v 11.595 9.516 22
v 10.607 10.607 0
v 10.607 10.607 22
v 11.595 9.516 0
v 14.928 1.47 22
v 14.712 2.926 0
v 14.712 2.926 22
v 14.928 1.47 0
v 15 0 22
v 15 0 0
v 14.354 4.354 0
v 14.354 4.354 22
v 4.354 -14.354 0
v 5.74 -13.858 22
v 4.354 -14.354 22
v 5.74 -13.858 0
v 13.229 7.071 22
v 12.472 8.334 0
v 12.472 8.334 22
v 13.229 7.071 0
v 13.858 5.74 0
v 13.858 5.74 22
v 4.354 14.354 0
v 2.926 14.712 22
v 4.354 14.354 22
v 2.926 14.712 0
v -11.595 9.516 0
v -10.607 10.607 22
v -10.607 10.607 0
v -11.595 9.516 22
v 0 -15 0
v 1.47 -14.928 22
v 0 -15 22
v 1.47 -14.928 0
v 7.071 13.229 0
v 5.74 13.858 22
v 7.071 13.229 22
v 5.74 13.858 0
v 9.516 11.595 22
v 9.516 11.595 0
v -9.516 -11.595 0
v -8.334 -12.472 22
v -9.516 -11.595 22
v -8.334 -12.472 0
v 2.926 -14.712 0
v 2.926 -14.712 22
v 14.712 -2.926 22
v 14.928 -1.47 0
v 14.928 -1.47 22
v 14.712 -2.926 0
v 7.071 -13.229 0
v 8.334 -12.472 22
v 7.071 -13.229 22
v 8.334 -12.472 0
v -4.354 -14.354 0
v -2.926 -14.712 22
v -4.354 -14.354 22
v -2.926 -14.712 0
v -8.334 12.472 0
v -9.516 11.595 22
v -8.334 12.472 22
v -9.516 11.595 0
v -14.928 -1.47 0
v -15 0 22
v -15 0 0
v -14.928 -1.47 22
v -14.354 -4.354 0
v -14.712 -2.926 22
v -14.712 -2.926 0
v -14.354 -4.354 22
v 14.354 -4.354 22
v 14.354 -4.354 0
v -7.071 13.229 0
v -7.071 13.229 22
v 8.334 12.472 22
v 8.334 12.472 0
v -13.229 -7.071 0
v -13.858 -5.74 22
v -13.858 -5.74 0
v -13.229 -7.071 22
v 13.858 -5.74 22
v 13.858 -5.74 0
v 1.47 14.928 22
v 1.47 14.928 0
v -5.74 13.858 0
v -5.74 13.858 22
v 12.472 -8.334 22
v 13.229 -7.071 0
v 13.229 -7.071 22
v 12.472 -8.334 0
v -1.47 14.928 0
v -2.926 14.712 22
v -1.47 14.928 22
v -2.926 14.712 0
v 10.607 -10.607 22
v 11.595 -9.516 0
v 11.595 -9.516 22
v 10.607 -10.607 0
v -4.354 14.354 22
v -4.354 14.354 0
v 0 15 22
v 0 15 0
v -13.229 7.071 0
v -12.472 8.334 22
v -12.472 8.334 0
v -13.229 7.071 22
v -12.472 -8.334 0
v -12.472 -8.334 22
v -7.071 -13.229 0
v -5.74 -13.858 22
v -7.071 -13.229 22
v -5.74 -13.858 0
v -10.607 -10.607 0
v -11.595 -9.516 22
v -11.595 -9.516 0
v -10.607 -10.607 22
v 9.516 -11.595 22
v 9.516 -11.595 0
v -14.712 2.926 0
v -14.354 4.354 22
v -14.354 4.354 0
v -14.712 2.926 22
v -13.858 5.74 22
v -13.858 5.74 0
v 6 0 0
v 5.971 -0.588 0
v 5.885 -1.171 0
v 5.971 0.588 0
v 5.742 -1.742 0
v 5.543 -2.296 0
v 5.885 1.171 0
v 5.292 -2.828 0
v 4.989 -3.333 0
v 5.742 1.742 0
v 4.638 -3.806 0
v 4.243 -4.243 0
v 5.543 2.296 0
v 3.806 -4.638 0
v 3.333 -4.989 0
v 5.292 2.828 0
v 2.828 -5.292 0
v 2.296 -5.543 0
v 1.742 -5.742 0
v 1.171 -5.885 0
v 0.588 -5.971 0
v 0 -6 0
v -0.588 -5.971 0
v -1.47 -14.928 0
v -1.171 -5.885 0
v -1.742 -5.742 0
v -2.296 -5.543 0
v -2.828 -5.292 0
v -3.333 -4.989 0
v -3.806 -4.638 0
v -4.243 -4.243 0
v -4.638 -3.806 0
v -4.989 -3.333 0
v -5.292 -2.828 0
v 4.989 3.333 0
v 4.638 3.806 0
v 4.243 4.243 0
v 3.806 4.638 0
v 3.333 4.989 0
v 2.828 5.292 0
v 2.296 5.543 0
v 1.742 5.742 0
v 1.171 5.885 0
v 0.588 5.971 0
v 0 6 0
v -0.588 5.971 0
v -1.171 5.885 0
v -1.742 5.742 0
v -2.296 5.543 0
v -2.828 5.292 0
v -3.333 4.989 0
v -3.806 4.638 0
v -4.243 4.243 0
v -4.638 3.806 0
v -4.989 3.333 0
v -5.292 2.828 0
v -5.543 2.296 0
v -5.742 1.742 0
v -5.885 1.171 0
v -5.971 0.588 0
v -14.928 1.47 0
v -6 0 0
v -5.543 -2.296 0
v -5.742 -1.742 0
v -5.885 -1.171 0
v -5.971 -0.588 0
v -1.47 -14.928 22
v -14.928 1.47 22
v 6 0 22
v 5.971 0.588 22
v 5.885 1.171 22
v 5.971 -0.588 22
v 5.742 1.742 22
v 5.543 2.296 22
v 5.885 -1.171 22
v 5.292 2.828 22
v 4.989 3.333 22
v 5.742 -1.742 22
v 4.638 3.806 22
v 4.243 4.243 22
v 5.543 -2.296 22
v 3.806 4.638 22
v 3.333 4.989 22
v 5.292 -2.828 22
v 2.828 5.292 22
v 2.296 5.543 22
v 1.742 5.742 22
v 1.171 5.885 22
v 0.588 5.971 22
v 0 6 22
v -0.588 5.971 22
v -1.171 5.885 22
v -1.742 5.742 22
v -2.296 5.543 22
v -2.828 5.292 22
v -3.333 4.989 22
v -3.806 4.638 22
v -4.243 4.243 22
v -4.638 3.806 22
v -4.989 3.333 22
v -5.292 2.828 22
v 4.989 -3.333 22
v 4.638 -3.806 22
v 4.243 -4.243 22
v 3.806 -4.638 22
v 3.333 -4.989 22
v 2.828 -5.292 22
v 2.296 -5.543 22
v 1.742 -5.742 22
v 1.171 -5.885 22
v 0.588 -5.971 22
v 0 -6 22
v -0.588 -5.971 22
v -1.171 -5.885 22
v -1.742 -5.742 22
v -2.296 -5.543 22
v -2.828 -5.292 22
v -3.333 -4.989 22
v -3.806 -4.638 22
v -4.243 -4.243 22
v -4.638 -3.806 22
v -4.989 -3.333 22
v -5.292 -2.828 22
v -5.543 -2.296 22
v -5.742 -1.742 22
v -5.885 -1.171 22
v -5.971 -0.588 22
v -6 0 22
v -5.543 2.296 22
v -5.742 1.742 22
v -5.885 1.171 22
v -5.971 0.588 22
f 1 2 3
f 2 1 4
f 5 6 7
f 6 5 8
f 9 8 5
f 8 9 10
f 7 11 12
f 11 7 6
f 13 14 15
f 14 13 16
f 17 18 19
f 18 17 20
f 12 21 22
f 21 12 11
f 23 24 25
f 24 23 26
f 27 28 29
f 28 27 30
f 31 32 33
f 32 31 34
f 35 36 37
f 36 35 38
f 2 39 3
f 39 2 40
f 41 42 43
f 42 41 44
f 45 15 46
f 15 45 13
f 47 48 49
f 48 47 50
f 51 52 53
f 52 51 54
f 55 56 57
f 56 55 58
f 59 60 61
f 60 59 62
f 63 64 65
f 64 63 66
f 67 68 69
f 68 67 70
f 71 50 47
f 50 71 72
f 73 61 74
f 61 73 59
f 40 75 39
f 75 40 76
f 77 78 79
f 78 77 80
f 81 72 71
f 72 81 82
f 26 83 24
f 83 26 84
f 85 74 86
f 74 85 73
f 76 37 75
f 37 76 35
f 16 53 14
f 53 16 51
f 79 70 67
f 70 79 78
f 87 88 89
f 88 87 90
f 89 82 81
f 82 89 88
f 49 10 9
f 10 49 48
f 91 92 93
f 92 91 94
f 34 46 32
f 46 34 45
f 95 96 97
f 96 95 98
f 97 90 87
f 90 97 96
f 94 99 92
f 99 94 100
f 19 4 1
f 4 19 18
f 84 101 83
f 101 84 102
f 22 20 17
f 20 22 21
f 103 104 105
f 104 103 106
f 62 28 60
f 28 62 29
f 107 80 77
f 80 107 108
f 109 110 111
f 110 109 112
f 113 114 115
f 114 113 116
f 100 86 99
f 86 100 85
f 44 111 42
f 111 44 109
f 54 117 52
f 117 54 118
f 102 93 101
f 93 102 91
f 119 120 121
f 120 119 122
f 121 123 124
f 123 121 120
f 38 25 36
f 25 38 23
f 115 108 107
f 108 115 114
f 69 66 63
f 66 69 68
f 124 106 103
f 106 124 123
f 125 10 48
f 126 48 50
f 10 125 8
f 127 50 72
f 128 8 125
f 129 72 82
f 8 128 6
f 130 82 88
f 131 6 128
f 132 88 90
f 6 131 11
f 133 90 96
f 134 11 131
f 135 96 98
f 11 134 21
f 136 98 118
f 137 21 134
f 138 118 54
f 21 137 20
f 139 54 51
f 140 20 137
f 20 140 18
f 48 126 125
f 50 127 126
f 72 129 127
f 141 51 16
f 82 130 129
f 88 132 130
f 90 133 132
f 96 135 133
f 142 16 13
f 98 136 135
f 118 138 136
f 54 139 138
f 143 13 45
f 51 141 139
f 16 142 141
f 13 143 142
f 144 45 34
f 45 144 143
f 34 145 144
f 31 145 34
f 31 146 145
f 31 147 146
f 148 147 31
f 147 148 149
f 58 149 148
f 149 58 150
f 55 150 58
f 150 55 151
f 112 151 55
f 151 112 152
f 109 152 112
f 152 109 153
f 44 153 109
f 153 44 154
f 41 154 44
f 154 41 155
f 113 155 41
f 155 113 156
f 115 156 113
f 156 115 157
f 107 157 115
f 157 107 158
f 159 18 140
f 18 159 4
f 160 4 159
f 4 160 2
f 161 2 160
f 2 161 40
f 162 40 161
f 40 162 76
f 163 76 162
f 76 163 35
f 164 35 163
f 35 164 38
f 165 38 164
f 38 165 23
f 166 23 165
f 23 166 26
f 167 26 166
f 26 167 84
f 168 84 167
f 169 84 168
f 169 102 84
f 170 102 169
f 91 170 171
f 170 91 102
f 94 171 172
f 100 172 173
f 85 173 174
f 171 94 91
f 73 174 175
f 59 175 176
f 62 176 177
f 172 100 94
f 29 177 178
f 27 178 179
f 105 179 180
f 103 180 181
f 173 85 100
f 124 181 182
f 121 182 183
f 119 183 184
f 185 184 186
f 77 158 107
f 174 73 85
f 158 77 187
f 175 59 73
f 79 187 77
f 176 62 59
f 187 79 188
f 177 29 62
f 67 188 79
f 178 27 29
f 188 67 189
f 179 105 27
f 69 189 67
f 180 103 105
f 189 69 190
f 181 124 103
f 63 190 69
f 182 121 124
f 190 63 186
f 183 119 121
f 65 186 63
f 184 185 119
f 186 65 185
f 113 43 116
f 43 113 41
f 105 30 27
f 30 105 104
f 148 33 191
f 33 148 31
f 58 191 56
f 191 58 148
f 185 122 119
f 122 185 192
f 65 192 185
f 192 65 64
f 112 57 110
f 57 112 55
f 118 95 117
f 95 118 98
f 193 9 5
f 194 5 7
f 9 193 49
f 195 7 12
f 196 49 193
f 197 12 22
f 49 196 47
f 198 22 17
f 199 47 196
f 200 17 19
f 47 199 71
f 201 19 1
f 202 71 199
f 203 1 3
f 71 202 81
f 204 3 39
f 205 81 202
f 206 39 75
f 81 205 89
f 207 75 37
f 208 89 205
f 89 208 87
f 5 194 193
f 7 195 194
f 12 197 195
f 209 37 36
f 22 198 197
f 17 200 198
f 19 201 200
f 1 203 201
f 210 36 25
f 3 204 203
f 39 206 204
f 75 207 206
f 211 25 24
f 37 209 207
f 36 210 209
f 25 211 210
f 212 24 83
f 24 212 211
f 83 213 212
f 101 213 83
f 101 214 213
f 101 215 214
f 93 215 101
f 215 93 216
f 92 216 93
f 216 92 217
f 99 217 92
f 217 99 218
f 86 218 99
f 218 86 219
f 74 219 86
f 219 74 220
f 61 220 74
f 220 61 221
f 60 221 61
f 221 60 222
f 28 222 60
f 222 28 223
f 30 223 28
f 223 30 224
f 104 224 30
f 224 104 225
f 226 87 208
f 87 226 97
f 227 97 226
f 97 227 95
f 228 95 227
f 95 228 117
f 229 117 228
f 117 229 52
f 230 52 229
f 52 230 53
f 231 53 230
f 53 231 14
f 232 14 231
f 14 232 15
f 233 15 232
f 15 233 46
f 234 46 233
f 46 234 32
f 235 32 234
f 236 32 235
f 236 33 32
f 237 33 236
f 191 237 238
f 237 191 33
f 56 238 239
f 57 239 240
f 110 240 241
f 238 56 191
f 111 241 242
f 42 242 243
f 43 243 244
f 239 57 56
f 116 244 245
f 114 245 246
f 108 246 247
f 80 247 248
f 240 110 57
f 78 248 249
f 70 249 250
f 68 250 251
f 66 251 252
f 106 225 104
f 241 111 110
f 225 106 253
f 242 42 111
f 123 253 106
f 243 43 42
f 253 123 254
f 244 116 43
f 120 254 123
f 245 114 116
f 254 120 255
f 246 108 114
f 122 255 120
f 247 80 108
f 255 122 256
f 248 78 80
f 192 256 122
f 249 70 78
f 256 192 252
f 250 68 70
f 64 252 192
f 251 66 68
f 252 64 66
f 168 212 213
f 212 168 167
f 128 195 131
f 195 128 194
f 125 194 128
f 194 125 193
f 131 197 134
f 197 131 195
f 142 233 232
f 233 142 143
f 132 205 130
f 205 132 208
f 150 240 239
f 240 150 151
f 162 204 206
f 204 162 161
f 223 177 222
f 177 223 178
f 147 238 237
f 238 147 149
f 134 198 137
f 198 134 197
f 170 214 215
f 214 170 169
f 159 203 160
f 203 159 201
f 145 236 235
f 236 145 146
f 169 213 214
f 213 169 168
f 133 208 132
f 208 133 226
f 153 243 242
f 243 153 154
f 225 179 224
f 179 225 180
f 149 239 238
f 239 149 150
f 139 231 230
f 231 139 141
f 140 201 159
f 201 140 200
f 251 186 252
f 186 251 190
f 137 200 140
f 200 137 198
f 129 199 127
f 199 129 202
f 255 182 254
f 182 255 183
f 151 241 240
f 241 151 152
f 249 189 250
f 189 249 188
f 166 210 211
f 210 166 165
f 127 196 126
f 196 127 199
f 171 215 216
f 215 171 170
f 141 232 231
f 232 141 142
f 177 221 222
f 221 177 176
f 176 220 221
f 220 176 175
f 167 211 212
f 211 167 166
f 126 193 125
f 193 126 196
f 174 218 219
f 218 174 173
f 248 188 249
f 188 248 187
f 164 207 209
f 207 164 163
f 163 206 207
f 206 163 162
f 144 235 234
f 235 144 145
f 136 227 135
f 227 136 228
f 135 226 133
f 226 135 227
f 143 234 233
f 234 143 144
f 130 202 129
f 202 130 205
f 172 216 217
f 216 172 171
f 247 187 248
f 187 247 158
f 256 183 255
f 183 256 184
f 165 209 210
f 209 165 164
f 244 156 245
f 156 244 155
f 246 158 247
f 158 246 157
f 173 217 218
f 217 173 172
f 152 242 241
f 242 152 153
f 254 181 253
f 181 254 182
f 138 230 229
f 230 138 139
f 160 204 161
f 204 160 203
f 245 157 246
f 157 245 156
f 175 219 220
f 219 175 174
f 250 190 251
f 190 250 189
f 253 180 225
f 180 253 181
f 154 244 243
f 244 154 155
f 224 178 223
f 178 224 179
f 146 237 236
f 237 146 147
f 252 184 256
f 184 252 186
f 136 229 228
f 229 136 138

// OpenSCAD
module threaded_heat_set_insert() {
    difference() {
        // Outer cylinder
        cylinder(h = 22.0, d = 30.0, $fn = 64);
        
        // Inner thread space
        translate([0, 0, -1])
        cylinder(h = 24.0, d = 12.0, $fn = 64);
    }
}

threaded_heat_set_insert();
